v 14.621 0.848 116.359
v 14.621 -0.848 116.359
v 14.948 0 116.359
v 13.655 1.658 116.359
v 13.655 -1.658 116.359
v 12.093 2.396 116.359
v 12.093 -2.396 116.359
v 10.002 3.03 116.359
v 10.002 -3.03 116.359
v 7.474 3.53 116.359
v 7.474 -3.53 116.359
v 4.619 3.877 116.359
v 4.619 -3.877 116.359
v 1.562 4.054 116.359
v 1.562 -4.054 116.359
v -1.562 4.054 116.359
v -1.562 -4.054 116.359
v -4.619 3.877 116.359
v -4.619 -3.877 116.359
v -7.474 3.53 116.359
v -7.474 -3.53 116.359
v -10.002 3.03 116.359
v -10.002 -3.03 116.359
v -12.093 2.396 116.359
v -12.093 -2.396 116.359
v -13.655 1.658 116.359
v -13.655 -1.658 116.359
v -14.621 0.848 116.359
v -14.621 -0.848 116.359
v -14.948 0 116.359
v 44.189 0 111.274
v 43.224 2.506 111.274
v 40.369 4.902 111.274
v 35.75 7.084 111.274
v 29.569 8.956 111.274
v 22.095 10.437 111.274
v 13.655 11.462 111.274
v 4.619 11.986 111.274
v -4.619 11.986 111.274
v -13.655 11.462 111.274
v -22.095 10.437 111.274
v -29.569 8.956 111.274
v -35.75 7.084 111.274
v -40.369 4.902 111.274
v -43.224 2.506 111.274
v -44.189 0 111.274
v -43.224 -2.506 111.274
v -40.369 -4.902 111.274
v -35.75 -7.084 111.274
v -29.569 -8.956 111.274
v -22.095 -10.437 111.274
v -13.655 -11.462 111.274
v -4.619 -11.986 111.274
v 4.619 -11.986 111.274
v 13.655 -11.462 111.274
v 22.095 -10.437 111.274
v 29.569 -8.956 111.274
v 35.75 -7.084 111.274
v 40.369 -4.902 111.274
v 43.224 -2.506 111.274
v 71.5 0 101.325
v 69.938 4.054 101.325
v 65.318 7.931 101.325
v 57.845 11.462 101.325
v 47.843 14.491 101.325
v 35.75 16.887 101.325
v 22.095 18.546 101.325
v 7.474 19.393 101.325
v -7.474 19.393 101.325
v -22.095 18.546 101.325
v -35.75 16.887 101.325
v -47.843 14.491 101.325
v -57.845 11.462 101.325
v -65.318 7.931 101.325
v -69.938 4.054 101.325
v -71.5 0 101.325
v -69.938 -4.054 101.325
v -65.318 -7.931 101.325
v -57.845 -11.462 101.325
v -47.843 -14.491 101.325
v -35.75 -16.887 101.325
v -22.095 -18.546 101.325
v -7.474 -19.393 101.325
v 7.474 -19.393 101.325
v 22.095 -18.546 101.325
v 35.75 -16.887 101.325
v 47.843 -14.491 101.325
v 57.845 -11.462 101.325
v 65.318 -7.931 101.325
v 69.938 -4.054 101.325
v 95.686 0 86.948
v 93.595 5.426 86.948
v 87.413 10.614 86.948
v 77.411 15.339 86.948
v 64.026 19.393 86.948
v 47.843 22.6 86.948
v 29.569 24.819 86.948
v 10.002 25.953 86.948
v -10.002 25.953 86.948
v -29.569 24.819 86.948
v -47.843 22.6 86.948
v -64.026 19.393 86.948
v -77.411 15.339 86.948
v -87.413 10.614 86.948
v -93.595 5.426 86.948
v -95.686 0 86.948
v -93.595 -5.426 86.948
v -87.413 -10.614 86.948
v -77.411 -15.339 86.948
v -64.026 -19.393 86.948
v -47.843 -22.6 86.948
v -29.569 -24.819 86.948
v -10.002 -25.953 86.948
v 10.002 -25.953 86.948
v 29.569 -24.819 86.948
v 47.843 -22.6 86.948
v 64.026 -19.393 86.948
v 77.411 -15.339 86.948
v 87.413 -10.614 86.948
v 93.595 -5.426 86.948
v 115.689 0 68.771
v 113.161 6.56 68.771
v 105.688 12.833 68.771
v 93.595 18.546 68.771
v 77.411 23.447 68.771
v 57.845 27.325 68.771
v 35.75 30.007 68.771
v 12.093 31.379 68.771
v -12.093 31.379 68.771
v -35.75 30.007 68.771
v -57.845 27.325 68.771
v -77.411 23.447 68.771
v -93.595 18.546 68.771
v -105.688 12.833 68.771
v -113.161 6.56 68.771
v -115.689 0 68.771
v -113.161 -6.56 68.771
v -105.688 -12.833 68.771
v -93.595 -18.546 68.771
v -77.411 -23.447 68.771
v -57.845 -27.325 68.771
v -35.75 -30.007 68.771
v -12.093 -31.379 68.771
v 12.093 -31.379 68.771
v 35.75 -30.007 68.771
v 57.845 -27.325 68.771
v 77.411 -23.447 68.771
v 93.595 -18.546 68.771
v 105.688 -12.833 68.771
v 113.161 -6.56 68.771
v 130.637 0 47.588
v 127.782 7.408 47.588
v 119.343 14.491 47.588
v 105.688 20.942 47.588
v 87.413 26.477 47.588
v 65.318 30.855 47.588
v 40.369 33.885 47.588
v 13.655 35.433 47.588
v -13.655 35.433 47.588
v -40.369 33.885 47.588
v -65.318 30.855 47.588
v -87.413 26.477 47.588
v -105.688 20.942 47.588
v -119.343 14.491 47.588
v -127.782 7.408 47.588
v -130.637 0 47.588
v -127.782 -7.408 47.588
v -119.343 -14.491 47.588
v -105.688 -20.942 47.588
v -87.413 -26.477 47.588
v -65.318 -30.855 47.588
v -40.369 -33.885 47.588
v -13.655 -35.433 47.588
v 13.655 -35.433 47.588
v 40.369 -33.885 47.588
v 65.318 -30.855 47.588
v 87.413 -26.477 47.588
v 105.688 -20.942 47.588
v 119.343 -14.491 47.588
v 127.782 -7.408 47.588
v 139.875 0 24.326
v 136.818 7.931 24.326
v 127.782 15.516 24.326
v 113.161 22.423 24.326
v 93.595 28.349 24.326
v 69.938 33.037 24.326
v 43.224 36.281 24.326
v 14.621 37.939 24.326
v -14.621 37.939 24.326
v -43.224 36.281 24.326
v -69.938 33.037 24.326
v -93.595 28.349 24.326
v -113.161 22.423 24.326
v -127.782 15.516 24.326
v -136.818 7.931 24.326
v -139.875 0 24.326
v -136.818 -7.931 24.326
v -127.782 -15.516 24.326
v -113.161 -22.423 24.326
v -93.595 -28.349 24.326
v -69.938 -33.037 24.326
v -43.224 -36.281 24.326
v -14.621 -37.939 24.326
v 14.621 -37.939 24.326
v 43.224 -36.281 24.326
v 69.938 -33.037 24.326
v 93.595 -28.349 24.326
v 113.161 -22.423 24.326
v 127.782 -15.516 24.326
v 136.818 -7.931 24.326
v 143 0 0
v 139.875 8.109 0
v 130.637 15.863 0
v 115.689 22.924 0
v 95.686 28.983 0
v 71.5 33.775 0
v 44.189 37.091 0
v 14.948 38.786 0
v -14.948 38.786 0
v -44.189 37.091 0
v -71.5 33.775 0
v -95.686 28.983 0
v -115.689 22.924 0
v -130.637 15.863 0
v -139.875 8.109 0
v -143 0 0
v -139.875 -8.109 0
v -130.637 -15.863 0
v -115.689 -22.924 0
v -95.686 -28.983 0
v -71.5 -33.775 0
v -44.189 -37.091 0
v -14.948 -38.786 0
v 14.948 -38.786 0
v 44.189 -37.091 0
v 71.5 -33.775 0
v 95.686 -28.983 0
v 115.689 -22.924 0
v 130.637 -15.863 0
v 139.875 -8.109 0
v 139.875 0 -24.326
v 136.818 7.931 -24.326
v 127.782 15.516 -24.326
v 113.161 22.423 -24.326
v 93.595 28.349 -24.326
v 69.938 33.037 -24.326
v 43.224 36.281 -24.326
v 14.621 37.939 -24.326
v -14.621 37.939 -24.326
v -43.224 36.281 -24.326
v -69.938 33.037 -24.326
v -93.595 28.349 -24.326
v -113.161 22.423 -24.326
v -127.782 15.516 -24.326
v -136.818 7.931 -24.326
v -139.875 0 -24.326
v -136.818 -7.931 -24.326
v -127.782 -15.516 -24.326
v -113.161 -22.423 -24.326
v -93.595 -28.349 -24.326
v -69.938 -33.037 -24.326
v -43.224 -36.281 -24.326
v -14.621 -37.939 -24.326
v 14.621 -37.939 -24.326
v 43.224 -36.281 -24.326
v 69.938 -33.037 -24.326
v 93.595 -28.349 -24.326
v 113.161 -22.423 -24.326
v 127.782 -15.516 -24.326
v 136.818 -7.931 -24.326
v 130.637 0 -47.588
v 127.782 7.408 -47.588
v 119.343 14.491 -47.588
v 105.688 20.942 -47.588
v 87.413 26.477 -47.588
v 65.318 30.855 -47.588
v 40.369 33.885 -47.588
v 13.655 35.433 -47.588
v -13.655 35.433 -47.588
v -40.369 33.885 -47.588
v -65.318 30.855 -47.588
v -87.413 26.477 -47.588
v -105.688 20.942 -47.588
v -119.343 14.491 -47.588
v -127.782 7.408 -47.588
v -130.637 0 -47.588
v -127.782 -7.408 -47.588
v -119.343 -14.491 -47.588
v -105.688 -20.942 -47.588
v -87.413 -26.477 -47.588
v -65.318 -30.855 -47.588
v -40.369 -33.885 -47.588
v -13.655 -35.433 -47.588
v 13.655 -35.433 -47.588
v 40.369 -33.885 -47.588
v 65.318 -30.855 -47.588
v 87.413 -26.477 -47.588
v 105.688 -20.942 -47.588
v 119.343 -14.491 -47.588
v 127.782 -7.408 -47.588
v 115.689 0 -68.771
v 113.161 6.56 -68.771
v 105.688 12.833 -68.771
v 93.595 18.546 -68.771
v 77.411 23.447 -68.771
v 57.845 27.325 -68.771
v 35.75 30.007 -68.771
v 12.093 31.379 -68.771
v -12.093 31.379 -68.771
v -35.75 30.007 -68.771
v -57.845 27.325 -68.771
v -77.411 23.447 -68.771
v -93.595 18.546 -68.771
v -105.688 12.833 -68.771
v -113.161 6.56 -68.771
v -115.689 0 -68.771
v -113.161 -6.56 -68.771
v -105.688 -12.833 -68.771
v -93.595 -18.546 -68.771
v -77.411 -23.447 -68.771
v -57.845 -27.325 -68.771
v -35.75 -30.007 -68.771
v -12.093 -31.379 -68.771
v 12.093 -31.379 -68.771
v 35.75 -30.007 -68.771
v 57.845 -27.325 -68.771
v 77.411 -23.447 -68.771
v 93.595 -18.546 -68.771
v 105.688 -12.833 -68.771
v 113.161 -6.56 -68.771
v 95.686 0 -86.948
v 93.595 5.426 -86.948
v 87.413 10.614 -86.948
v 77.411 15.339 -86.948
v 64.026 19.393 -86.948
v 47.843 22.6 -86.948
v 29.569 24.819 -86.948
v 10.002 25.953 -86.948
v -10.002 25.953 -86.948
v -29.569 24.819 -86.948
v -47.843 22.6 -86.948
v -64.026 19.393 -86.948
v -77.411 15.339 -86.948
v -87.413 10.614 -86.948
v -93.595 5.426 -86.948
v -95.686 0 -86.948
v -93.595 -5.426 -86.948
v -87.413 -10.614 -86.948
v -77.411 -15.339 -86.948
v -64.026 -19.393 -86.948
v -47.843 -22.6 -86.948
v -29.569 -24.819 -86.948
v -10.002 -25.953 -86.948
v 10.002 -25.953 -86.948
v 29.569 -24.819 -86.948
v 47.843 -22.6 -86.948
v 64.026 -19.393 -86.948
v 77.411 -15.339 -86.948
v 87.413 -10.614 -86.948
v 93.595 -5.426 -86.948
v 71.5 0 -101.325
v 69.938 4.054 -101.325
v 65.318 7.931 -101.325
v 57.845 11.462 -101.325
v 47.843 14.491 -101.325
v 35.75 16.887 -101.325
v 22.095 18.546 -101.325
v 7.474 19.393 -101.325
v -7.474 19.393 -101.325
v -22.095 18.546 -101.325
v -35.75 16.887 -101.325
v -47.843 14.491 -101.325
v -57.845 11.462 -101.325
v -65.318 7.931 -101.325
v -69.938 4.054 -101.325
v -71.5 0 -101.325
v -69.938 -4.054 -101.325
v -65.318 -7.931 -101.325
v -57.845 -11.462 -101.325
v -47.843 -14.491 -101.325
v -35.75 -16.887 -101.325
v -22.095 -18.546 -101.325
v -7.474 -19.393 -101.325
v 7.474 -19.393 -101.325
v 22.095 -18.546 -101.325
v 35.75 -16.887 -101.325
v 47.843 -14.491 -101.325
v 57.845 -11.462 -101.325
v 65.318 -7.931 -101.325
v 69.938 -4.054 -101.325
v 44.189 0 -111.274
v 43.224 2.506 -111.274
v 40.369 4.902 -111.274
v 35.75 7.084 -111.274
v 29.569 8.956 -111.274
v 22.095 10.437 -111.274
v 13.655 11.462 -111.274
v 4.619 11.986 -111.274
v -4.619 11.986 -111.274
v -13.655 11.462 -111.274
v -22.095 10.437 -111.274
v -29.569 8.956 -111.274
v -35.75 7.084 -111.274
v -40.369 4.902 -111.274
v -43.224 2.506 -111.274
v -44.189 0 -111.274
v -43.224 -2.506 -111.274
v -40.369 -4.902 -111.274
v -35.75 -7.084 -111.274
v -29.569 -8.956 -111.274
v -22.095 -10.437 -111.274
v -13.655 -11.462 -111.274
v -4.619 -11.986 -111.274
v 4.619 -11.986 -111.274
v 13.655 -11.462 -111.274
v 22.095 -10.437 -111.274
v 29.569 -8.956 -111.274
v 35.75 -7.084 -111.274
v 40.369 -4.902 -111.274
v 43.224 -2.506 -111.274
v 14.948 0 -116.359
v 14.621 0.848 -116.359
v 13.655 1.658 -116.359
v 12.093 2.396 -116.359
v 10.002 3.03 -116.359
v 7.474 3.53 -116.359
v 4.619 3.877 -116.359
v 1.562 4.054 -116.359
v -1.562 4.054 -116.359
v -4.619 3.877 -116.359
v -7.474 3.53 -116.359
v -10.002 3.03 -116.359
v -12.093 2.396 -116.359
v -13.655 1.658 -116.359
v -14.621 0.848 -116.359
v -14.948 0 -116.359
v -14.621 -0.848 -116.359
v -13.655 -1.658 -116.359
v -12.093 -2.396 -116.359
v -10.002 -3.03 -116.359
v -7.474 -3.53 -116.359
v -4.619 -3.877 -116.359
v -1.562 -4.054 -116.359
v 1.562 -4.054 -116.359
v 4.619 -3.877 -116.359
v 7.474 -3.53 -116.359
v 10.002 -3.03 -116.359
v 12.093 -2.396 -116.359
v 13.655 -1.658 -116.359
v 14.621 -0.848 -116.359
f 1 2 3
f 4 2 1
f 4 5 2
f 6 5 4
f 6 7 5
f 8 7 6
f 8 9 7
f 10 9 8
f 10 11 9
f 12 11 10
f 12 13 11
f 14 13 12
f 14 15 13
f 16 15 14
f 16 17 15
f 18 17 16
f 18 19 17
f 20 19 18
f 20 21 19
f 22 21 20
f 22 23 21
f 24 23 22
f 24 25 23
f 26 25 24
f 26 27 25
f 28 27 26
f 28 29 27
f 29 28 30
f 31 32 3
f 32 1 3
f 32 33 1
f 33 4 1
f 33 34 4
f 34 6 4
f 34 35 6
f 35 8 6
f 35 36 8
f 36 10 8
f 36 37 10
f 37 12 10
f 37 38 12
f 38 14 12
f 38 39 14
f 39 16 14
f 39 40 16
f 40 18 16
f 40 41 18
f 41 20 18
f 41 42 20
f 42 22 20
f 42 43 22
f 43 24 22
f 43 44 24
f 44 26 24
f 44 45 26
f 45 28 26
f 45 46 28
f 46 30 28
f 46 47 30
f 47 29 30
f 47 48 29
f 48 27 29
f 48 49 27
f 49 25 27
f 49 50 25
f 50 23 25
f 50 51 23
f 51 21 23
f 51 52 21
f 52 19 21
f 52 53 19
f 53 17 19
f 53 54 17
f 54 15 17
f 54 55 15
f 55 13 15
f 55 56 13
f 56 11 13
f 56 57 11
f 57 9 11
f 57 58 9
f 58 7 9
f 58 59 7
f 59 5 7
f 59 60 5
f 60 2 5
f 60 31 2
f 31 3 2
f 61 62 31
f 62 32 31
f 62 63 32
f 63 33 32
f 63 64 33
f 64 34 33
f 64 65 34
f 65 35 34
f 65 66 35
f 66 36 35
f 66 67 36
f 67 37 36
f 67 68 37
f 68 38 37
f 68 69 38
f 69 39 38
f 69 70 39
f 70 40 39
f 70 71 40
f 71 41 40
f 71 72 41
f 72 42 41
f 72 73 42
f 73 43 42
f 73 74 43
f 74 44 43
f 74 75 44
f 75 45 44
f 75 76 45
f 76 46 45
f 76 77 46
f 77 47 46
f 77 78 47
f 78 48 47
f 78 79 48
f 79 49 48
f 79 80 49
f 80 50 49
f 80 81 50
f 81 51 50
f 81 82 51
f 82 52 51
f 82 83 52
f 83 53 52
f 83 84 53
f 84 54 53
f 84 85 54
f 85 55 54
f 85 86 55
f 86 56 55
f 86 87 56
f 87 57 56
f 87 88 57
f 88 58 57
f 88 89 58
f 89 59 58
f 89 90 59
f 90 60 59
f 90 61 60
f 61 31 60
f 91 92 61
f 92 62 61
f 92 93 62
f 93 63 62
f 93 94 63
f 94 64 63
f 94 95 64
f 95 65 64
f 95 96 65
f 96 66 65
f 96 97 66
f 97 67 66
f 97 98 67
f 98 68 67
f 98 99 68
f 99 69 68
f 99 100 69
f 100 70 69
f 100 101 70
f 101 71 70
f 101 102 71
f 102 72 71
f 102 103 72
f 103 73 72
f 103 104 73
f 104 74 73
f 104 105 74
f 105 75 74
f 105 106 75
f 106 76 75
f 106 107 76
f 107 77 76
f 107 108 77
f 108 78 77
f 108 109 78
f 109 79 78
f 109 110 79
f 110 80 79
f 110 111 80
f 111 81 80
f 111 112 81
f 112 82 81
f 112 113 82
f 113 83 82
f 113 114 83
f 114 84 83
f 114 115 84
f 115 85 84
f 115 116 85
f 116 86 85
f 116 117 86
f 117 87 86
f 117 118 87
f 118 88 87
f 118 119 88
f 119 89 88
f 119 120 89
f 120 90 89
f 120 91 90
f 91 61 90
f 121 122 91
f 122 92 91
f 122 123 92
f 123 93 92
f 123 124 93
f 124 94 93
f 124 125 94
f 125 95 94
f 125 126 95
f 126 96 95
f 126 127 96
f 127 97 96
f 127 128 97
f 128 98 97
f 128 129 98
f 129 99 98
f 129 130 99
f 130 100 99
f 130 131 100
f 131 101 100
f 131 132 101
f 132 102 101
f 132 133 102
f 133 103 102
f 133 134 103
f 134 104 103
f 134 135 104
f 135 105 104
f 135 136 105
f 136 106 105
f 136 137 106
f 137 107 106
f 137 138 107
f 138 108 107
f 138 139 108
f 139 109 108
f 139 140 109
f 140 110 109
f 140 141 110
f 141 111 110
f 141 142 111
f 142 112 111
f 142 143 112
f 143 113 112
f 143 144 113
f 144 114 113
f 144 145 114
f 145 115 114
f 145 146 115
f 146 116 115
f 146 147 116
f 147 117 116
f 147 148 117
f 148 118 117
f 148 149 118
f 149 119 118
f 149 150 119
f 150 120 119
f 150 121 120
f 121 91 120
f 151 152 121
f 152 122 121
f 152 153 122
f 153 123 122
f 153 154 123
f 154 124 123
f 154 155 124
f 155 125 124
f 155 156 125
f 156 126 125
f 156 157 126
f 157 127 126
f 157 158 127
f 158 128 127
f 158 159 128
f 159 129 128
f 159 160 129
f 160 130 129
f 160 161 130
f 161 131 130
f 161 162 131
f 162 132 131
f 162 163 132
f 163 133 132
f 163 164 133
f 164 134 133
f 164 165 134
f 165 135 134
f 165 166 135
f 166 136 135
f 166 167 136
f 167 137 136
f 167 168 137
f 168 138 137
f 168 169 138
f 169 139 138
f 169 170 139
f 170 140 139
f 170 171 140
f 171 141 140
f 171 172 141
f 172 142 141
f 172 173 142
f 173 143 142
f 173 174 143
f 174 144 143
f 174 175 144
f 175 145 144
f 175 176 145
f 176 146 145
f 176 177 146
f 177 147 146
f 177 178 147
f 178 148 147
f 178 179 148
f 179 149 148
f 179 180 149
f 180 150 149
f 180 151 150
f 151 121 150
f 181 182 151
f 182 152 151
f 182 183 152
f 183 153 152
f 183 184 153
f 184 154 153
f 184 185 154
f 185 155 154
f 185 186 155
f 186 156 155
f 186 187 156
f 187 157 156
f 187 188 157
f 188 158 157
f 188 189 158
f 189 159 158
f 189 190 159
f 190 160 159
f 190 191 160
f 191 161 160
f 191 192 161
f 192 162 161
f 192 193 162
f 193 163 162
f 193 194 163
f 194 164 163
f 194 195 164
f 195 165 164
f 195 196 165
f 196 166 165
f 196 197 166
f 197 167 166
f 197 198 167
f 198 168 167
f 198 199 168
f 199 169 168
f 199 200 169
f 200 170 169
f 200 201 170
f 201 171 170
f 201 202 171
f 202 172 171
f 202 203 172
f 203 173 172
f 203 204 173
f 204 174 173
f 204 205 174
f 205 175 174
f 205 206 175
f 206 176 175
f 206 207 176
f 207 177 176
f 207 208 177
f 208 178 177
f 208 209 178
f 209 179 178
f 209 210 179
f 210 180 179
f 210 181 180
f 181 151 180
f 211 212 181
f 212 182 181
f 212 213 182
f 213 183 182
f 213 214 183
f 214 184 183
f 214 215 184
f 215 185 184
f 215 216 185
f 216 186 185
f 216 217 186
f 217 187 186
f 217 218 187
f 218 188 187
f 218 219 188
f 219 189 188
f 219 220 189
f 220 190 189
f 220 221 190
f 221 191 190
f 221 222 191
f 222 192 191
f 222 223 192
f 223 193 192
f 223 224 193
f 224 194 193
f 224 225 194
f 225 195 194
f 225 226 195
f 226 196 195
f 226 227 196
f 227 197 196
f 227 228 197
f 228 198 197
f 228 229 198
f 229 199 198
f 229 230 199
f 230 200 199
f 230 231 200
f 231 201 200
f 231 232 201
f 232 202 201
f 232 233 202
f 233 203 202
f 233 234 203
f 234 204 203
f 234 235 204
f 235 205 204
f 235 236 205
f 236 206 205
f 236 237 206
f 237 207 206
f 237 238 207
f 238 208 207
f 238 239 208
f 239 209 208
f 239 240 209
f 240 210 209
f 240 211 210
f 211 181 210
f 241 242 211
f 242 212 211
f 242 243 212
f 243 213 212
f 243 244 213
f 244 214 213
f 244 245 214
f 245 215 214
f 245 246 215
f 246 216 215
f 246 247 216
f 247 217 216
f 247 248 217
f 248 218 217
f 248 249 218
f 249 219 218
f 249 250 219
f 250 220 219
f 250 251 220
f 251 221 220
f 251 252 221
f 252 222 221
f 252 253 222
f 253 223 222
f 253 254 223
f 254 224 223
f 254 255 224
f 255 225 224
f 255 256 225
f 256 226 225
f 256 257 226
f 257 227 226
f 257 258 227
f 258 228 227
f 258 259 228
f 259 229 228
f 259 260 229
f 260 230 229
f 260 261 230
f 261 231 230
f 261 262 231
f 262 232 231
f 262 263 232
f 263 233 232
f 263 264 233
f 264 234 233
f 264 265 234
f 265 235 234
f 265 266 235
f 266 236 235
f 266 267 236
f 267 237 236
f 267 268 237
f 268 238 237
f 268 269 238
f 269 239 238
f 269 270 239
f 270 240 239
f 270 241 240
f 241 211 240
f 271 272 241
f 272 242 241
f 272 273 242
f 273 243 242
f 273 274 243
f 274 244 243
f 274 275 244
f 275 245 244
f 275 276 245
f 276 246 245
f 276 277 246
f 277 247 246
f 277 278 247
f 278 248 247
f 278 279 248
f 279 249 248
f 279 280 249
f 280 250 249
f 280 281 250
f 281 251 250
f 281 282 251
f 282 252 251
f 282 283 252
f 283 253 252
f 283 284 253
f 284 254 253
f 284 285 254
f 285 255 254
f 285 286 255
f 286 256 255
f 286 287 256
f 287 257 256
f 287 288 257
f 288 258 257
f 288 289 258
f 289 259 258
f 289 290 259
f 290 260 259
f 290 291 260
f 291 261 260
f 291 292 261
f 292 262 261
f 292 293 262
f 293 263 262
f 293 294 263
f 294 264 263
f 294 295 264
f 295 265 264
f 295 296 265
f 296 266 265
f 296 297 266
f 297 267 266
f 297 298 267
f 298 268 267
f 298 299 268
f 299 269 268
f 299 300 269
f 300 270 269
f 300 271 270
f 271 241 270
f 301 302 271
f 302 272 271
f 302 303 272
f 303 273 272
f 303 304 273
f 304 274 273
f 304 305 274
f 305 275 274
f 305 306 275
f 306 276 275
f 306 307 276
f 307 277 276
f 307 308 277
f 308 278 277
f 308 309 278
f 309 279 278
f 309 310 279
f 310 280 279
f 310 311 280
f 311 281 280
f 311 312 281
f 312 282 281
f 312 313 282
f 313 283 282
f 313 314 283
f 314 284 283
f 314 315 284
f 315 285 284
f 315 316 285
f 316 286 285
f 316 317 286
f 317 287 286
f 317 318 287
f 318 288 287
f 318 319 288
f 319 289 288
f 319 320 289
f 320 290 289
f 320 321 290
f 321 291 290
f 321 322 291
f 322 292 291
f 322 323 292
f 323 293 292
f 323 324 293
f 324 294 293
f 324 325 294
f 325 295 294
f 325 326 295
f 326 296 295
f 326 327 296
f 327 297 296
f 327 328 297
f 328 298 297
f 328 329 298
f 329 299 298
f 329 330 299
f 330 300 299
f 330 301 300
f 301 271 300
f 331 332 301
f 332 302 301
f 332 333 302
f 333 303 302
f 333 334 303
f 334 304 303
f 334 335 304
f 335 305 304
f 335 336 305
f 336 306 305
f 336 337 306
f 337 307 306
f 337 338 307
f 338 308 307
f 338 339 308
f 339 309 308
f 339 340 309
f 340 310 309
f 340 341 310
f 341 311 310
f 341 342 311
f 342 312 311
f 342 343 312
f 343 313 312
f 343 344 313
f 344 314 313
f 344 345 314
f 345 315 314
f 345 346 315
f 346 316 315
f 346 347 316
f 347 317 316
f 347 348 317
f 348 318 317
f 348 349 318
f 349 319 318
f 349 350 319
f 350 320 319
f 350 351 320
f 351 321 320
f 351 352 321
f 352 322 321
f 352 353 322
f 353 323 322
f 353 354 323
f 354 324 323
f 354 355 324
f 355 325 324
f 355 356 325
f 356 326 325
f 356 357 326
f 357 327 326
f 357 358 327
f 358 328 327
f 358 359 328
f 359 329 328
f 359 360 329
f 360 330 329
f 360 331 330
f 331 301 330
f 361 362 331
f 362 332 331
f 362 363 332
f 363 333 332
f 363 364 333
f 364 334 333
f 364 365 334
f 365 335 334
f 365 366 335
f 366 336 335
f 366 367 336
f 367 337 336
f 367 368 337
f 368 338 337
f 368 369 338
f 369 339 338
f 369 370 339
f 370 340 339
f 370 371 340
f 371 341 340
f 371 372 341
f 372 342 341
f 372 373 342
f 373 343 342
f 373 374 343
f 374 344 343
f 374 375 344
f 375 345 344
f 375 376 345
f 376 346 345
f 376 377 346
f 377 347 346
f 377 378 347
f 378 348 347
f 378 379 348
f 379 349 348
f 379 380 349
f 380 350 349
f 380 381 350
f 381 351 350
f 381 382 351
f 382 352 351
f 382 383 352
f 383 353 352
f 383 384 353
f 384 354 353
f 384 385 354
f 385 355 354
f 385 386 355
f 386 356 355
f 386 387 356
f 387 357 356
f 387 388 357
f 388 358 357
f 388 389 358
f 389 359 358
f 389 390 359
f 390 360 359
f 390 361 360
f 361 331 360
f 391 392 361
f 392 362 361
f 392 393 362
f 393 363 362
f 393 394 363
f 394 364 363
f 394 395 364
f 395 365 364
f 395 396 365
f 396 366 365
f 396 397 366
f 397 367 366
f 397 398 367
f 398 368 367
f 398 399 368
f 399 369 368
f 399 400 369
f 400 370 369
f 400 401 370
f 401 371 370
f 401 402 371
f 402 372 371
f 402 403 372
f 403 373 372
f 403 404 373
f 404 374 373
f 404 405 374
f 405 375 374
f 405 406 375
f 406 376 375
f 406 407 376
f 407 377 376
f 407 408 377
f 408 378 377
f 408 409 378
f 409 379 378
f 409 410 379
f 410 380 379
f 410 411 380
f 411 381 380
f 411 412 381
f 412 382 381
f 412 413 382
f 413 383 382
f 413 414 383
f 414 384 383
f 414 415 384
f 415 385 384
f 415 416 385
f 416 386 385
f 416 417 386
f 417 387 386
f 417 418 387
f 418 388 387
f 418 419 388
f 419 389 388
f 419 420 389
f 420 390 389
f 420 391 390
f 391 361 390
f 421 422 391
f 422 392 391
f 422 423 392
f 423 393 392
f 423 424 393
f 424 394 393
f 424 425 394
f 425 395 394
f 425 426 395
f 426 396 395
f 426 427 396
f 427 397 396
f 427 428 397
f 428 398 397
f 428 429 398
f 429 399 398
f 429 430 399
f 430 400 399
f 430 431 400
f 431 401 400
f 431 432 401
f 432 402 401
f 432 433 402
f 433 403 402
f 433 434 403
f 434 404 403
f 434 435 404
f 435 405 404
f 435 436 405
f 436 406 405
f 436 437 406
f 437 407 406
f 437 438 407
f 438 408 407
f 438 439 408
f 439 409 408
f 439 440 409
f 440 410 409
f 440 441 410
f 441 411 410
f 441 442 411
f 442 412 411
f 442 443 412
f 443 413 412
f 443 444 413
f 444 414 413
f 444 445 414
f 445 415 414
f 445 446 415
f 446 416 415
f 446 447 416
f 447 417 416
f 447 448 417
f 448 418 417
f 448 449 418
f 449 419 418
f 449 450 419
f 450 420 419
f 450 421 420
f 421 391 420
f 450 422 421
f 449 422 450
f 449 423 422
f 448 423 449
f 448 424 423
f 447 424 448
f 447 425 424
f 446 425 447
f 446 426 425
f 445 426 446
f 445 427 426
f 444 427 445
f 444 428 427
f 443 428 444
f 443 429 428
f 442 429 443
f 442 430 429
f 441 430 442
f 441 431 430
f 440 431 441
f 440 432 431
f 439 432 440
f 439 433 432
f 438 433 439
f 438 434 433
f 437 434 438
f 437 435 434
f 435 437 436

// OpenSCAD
// Generated by SolidPython 1.0.1 on 2020-07-29 00:46:49


scale(v = [11, 3, 9]) {
	sphere(r = 13);
}
/***********************************************
*********      SolidPython code:      **********
************************************************
 
# import packages: SolidPython
from solid import *
from solid.utils import *
from itertools import chain, combinations, permutations


class Resize:

    def __init__(self, scad_file):
        self.scad_file = scad_file
        #self.scad_file = import_scad(scad_file)
        # cone/cylinder param:
        self.r1 = 0
        self.r2 = 0
        self.h = 0
        # rectangular prism param:
        self.w = 0
        self.l = 0
        # ellipse param:
        self.r = 0

    # import OpenScad code (file name corresponds to shape)


    # classify shape + parameters
    def assign(self, param1, param2, param3):
        if self.scad_file == 'cone.scad':
            self.r1 = param1
            self.r2 = param2
            self.h = param3
        elif self.scad_file == 'cylinder.scad':
            self.r1 = param1
            self.r2 = param2
            self.h = param3
        elif self.scad_file == 'rectangularPrism.scad':
            self.h = param1
            self.l = param2
            self.w = param3
        else:
            self.r = param1
            self.h = param2

    # resize parameters
    def iterate(self):
        x = range(3, 20, 2)
        i = 1
        if self.scad_file == 'cone.scad':
            tempList = list(permutations(x, 2))
            for temp in tempList:
                param1 = temp[0]
                param2 = temp[1]
                filepath = 'produced_scad_files/' + 'cone' + str(param1) + '_' + str(param2) + '_' + '.scad'
                scad_render_to_file(cylinder(h=param1, r1=param2, r2=0), filepath)

        elif self.scad_file == 'cylinder.scad':
            tempList = list(permutations(x, 3))
            for temp in tempList:
                param1 = temp[0]
                param2 = temp[1]
                filepath = 'produced_scad_files/' + 'cylinder' + str(param1) + '_' + str(param2) + '_' + '.scad'
                scad_render_to_file(cylinder(h=param1, r1=param2, r2=param2), filepath)

        elif self.scad_file == 'rectangularPrism.scad':
            tempList = list(permutations(x, 3))
            for temp in tempList:
                param1 = temp[0]
                param2 = temp[1]
                param3 = temp[2]
                filepath = 'produced_scad_files/' + 'rectangularPrism' + str(param1) + '_' + str(param2) + '_' + str(
                    param3) + '.scad'
                scad_render_to_file(cube(size=(param1, param2, param3)), filepath)

        elif self.scad_file == 'ellipse.scad':
            tempList = list(permutations(x, 4))
            for temp in tempList:
                param1 = temp[0]
                param2 = temp[1]
                param3 = temp[2]
                param4 = temp[3]
                filepath = 'produced_scad_files/' + 'ellipse' + str(param1) + '_' + str(param2) + '_' + str(param3) + '_' + str(param4) + '.scad'
                scad_render_to_file(scale([param1, param2, param3])(sphere(r=param4)), filepath)

    def render_to_scadfile(self):
        scad_render_to_file(scad, 'example.scad') 
 
************************************************/
